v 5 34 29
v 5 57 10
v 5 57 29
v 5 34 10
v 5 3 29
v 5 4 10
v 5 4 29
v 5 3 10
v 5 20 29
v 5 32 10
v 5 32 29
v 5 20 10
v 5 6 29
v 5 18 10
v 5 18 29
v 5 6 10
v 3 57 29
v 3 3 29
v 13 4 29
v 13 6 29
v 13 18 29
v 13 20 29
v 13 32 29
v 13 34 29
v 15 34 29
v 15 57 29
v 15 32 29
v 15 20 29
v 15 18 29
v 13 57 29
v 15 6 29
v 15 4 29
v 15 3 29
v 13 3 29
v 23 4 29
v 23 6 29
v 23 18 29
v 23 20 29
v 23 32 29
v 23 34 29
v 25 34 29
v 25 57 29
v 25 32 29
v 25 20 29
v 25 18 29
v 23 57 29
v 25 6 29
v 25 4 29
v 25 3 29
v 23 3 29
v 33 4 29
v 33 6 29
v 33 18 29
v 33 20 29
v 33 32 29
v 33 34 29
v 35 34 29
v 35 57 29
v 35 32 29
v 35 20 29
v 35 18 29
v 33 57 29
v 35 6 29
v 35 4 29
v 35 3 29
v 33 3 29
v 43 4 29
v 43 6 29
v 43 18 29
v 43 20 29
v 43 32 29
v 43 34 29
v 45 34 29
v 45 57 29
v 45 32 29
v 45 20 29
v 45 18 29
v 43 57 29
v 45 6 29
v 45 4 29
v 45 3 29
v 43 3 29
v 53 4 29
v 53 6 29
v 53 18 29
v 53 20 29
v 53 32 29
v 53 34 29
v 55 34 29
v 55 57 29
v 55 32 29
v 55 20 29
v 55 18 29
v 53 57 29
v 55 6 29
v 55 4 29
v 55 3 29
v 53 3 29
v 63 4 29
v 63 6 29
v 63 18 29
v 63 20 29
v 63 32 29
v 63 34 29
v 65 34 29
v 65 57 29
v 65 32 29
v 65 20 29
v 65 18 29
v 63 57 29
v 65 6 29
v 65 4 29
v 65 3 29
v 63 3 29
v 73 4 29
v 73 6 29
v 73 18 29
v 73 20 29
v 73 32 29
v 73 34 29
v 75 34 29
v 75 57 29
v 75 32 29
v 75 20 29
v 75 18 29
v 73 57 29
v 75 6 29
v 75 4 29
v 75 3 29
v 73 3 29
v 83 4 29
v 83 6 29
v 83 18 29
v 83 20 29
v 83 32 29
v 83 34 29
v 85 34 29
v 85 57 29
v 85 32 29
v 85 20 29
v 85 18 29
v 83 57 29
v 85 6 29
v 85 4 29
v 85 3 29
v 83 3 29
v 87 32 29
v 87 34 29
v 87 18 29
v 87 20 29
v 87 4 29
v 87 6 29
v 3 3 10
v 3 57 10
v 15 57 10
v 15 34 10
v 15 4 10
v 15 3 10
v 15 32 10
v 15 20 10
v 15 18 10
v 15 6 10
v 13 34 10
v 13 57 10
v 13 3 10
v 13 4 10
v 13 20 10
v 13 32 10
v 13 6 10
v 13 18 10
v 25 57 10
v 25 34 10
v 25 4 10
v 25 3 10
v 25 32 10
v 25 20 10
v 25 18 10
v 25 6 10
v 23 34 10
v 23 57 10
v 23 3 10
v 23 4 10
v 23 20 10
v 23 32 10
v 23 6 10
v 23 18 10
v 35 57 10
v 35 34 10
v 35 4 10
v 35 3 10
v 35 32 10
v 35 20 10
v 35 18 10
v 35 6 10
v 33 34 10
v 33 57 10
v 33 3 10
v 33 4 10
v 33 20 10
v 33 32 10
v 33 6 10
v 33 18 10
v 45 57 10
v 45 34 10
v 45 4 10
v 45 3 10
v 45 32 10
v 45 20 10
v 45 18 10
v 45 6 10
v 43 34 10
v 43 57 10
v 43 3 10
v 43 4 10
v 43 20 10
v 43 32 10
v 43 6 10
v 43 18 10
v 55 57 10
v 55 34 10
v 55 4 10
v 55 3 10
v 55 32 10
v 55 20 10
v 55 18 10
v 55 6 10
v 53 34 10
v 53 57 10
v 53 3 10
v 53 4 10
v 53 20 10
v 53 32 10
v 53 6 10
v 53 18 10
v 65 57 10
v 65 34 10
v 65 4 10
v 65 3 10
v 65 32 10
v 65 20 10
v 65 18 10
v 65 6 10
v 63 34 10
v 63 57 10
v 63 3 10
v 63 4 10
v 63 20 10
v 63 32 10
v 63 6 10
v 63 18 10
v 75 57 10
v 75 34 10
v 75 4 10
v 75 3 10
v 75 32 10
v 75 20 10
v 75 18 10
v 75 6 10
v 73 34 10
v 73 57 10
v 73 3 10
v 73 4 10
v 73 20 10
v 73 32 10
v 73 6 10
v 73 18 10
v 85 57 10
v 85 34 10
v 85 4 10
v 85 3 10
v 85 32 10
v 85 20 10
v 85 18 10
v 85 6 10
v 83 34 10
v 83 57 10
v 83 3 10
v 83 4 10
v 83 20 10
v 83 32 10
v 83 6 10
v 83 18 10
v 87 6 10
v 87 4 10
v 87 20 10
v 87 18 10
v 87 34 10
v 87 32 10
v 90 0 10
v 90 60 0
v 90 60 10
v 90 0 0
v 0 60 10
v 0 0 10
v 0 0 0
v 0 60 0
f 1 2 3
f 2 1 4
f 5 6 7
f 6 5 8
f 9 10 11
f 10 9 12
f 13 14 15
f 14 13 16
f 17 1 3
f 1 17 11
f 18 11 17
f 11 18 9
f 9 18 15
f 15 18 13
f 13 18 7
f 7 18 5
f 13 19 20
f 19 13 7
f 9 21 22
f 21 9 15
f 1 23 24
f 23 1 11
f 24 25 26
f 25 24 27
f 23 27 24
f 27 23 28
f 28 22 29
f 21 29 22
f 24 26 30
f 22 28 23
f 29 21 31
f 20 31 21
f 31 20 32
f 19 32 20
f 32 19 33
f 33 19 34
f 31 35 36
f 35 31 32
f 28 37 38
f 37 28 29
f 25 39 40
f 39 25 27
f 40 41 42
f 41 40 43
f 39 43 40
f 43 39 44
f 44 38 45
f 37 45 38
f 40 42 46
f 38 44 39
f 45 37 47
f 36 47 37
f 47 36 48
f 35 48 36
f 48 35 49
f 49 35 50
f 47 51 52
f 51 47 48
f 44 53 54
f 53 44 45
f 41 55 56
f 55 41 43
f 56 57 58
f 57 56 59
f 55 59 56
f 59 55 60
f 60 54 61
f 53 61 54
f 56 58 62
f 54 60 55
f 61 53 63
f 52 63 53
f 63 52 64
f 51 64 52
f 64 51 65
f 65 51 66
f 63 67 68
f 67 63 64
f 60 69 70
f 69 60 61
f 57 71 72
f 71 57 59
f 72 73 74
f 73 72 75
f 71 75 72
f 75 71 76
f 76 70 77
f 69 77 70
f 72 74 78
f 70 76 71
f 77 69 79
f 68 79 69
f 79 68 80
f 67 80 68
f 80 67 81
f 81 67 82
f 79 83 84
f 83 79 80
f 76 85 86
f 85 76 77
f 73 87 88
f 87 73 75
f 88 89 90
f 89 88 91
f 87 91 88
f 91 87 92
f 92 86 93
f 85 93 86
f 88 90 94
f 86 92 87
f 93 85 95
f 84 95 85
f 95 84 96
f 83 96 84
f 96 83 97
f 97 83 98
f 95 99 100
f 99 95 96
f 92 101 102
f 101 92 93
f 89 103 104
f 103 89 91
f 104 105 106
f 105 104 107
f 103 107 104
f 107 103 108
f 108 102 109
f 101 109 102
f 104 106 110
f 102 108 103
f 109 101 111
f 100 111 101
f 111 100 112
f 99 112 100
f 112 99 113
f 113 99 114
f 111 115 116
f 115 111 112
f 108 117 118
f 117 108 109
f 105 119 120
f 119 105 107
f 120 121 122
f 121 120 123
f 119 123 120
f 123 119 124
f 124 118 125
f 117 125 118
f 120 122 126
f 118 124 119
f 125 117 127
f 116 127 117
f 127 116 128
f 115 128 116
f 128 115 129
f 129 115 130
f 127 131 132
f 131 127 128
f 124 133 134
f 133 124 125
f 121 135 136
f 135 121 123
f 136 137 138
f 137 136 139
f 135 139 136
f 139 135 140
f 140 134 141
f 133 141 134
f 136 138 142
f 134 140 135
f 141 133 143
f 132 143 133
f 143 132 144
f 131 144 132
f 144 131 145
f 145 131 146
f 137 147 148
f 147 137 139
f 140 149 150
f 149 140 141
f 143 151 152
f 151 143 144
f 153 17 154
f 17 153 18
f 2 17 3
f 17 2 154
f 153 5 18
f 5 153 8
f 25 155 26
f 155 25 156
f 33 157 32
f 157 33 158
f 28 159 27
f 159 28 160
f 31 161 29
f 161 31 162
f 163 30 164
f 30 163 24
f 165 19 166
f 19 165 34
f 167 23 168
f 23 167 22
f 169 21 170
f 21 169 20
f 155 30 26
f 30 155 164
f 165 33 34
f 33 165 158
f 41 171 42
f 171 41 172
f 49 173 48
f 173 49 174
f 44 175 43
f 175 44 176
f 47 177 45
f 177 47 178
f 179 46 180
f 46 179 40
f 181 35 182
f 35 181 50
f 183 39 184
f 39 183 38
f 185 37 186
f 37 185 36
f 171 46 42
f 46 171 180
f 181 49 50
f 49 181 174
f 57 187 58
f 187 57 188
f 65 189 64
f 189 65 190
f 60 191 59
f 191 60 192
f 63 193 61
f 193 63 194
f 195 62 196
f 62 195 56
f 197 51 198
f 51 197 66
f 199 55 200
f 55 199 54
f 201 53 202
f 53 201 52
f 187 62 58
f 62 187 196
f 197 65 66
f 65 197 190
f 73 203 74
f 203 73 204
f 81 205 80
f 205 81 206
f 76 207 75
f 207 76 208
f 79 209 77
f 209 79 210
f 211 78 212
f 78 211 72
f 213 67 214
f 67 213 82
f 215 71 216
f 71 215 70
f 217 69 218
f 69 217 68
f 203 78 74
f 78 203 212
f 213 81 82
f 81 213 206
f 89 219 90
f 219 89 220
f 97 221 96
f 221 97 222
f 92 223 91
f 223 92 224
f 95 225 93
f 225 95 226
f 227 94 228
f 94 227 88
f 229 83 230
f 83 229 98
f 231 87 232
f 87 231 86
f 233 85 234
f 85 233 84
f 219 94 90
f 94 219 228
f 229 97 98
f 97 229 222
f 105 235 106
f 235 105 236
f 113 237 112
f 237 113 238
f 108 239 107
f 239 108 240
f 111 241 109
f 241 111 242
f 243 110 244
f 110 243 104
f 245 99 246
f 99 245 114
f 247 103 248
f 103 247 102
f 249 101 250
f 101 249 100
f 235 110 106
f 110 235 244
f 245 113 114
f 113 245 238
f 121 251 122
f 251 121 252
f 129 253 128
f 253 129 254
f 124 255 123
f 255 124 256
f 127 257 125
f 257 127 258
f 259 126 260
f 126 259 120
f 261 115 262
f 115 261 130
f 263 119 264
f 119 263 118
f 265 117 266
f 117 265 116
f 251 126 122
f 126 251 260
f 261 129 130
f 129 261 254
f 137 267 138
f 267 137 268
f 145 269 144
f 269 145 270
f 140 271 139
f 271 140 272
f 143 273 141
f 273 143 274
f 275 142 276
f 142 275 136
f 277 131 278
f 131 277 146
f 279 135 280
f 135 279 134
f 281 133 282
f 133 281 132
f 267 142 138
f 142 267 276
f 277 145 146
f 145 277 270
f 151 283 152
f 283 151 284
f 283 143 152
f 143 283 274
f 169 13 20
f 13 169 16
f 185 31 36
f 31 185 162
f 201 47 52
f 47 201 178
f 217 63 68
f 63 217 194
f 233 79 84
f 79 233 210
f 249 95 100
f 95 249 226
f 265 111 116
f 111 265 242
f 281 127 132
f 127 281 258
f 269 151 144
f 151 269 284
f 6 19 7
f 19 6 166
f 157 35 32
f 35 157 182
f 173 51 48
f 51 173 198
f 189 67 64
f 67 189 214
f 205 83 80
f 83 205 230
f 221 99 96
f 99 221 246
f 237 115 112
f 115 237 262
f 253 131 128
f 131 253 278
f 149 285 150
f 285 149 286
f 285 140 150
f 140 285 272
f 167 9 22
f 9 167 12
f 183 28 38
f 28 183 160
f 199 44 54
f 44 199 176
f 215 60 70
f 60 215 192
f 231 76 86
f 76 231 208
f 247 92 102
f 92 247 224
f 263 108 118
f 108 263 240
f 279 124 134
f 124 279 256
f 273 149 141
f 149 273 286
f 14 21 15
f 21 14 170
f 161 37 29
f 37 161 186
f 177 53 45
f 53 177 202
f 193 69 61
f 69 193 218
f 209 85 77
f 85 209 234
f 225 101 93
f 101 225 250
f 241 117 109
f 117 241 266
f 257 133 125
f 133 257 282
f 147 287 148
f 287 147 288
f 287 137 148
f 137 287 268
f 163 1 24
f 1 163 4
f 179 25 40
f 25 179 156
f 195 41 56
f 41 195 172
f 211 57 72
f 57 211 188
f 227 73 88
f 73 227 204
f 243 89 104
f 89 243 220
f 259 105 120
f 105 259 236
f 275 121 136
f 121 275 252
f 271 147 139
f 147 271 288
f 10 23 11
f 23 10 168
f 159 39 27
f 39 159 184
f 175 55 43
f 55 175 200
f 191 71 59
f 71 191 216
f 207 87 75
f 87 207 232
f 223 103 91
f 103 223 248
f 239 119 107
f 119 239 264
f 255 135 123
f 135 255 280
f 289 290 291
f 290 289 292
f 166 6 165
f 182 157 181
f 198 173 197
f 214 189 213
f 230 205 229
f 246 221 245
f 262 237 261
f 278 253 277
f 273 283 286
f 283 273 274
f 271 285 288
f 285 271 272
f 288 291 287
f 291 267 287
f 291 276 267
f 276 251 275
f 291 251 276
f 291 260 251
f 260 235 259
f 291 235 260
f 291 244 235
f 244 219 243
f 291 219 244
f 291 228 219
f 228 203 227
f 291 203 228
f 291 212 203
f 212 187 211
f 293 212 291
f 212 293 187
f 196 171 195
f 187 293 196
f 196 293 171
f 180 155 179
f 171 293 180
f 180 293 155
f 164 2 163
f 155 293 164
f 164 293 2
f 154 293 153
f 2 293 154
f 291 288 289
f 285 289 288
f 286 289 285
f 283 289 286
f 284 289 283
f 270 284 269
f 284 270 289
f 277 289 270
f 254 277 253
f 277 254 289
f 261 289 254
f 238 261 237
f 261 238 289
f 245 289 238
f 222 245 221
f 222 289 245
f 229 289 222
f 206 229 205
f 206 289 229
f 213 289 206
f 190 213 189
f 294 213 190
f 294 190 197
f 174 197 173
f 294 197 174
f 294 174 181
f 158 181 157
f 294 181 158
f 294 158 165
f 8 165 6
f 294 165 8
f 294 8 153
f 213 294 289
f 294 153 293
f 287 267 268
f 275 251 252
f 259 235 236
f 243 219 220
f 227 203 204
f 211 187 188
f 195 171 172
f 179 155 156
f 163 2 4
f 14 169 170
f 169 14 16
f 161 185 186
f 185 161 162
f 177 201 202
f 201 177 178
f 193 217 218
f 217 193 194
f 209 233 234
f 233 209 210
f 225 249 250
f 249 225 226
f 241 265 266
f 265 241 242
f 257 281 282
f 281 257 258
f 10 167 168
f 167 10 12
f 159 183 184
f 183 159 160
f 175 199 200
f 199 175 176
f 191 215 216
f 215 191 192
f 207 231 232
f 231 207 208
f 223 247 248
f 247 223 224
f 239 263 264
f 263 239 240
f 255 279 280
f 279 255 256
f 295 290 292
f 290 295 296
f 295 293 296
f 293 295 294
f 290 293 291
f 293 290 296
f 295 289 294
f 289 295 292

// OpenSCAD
$fn = 32;

// ----------------------------------------------------------------------
// Heatsink: cross fin block
// ----------------------------------------------------------------------

// --- parameters (mm) ---
base_l = 90;              // base length, X
base_w = 60;              // base width, Y
base_t = 10;              // base plate thickness
fin_h = 20;               // fin height above the base
fin_t = 2;                // fin thickness
edge = 3;                 // margin from the base ends
pitch = 10;               // fin pitch
rib_pitch = 14;           // cross rib pitch
fit_tol = 0.1;            // tolerance for press fits, mm
free_tol = 0.3;           // tolerance for clearance fits, mm

n_fins = floor((base_l - 2 * edge - fin_t) / pitch) + 1;  // fin count
total_h = base_t + fin_h - 1;  // overall height
n_ribs = floor((base_w - 2 * edge) / rib_pitch);  // rib count

union() {
  cube([base_l, base_w, base_t]);
  for (i = [0 : n_fins - 1])
    translate([edge + i * pitch, edge, base_t - 1])
      cube([fin_t, base_w - 2 * edge, fin_h]);
  for (i = [0 : n_ribs - 1])
    translate([edge, edge + 1 + i * rib_pitch, base_t - 1])
      cube([base_l - 2 * edge, fin_t, fin_h]);
}
